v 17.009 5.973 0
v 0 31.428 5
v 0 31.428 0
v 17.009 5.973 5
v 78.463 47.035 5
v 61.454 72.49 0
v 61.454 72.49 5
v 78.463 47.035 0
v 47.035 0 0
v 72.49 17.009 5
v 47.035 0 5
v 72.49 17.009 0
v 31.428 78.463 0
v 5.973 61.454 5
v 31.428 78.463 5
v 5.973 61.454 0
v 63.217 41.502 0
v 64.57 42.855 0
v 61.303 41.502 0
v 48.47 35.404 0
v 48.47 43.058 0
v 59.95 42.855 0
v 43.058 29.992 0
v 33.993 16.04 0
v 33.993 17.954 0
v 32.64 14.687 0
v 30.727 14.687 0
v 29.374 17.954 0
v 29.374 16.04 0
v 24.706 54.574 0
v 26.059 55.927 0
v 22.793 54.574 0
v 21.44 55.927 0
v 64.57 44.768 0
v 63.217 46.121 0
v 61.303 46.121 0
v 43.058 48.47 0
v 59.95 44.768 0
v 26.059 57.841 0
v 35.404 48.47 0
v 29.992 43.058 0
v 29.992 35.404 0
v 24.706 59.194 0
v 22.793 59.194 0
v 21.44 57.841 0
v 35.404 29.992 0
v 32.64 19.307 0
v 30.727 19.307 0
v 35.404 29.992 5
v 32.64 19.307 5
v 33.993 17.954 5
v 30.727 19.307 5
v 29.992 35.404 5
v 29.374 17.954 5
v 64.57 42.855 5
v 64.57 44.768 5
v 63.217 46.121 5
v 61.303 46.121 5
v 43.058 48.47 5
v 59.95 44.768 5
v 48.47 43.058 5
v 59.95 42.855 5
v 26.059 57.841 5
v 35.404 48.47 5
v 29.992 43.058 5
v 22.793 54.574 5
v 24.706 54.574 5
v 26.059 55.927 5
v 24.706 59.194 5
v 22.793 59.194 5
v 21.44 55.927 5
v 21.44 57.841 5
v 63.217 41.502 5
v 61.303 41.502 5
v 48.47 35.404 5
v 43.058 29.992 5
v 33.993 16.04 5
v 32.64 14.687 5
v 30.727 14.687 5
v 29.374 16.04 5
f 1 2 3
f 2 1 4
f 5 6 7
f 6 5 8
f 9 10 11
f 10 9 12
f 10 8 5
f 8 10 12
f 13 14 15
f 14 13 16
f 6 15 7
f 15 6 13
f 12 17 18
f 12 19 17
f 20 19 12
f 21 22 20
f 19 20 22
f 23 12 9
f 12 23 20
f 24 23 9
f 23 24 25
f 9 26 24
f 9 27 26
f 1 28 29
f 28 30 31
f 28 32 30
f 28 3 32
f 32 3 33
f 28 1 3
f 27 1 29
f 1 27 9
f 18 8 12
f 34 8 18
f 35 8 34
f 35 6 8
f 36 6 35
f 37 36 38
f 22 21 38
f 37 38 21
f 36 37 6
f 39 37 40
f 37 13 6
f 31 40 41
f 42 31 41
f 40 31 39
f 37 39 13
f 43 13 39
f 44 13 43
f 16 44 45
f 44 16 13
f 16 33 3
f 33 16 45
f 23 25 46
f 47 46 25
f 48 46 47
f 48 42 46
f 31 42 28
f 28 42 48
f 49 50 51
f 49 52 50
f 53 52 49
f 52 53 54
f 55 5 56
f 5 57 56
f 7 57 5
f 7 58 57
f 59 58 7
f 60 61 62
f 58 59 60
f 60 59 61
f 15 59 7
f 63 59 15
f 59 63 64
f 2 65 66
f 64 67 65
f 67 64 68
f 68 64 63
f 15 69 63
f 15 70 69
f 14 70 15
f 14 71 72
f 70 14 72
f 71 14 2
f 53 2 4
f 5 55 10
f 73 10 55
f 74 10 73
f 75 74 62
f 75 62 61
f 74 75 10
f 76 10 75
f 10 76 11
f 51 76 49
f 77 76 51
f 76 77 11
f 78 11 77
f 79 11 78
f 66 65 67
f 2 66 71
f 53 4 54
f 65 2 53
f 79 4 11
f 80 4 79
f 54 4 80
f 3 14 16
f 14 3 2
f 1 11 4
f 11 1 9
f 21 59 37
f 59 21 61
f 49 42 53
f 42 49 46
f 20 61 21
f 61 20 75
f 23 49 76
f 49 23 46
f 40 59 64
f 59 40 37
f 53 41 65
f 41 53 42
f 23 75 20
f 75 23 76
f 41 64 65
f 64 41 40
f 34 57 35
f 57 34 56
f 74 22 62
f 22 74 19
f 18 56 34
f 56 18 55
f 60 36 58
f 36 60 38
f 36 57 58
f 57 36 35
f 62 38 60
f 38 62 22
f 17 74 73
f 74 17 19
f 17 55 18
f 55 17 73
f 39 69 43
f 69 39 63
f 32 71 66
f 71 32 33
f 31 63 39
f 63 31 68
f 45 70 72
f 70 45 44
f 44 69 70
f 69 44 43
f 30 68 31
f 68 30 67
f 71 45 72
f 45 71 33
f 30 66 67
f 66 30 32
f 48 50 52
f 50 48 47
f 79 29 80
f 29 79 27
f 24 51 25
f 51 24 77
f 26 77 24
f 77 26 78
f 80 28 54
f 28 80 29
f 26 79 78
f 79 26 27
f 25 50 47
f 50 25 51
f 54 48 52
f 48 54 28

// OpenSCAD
$fn = 32;

// ----------------------------------------------------------------------
// Polygon plate: 8-gon R40, 3 bolt windows
// ----------------------------------------------------------------------

// --- parameters (mm) ---
sides = 8;                // number of polygon sides
plate_r = 40;             // circumscribed radius of the polygon
bore_r = 10;              // centre bore radius
bolts = 3;                // number of bolt windows
ring_r = 23.48;           // bolt-circle radius
bolt_r = 2.5;             // bolt window radius
plate_t = 5;              // plate thickness, Z (extrusion height)

plate_d = 2 * plate_r;  // circumscribed diameter
bore_d = 2 * bore_r;  // centre bore diameter
bolt_d = 2 * bolt_r;  // bolt window diameter
ring_d = 2 * ring_r;  // bolt-circle diameter

profile = [[78.463, 47.035], [61.454, 72.49], [31.428, 78.463], [5.973, 61.454], [0, 31.428], [17.009, 5.973], [47.035, 0], [72.49, 17.009]];  // primary outline, 8 points, counter clockwise
void_1 = [[48.47, 43.058], [43.058, 48.47], [35.404, 48.47], [29.992, 43.058], [29.992, 35.404], [35.404, 29.992], [43.058, 29.992], [48.47, 35.404]];  // centre bore, 8 points
void_2 = [[64.57, 44.768], [63.217, 46.121], [61.303, 46.121], [59.95, 44.768], [59.95, 42.855], [61.303, 41.502], [63.217, 41.502], [64.57, 42.855]];  // bolt window 1, 8 points
void_3 = [[26.059, 57.841], [24.706, 59.194], [22.793, 59.194], [21.44, 57.841], [21.44, 55.927], [22.793, 54.574], [24.706, 54.574], [26.059, 55.927]];  // bolt window 2, 8 points
void_4 = [[33.993, 17.954], [32.64, 19.307], [30.727, 19.307], [29.374, 17.954], [29.374, 16.04], [30.727, 14.687], [32.64, 14.687], [33.993, 16.04]];  // bolt window 3, 8 points

// --- the one profile operation ---
difference() {
  linear_extrude(height = plate_t) polygon(points = profile);
  translate([0, 0, -1])
    linear_extrude(height = plate_t + 2) polygon(points = void_1);
  translate([0, 0, -1])
    linear_extrude(height = plate_t + 2) polygon(points = void_2);
  translate([0, 0, -1])
    linear_extrude(height = plate_t + 2) polygon(points = void_3);
  translate([0, 0, -1])
    linear_extrude(height = plate_t + 2) polygon(points = void_4);
}
